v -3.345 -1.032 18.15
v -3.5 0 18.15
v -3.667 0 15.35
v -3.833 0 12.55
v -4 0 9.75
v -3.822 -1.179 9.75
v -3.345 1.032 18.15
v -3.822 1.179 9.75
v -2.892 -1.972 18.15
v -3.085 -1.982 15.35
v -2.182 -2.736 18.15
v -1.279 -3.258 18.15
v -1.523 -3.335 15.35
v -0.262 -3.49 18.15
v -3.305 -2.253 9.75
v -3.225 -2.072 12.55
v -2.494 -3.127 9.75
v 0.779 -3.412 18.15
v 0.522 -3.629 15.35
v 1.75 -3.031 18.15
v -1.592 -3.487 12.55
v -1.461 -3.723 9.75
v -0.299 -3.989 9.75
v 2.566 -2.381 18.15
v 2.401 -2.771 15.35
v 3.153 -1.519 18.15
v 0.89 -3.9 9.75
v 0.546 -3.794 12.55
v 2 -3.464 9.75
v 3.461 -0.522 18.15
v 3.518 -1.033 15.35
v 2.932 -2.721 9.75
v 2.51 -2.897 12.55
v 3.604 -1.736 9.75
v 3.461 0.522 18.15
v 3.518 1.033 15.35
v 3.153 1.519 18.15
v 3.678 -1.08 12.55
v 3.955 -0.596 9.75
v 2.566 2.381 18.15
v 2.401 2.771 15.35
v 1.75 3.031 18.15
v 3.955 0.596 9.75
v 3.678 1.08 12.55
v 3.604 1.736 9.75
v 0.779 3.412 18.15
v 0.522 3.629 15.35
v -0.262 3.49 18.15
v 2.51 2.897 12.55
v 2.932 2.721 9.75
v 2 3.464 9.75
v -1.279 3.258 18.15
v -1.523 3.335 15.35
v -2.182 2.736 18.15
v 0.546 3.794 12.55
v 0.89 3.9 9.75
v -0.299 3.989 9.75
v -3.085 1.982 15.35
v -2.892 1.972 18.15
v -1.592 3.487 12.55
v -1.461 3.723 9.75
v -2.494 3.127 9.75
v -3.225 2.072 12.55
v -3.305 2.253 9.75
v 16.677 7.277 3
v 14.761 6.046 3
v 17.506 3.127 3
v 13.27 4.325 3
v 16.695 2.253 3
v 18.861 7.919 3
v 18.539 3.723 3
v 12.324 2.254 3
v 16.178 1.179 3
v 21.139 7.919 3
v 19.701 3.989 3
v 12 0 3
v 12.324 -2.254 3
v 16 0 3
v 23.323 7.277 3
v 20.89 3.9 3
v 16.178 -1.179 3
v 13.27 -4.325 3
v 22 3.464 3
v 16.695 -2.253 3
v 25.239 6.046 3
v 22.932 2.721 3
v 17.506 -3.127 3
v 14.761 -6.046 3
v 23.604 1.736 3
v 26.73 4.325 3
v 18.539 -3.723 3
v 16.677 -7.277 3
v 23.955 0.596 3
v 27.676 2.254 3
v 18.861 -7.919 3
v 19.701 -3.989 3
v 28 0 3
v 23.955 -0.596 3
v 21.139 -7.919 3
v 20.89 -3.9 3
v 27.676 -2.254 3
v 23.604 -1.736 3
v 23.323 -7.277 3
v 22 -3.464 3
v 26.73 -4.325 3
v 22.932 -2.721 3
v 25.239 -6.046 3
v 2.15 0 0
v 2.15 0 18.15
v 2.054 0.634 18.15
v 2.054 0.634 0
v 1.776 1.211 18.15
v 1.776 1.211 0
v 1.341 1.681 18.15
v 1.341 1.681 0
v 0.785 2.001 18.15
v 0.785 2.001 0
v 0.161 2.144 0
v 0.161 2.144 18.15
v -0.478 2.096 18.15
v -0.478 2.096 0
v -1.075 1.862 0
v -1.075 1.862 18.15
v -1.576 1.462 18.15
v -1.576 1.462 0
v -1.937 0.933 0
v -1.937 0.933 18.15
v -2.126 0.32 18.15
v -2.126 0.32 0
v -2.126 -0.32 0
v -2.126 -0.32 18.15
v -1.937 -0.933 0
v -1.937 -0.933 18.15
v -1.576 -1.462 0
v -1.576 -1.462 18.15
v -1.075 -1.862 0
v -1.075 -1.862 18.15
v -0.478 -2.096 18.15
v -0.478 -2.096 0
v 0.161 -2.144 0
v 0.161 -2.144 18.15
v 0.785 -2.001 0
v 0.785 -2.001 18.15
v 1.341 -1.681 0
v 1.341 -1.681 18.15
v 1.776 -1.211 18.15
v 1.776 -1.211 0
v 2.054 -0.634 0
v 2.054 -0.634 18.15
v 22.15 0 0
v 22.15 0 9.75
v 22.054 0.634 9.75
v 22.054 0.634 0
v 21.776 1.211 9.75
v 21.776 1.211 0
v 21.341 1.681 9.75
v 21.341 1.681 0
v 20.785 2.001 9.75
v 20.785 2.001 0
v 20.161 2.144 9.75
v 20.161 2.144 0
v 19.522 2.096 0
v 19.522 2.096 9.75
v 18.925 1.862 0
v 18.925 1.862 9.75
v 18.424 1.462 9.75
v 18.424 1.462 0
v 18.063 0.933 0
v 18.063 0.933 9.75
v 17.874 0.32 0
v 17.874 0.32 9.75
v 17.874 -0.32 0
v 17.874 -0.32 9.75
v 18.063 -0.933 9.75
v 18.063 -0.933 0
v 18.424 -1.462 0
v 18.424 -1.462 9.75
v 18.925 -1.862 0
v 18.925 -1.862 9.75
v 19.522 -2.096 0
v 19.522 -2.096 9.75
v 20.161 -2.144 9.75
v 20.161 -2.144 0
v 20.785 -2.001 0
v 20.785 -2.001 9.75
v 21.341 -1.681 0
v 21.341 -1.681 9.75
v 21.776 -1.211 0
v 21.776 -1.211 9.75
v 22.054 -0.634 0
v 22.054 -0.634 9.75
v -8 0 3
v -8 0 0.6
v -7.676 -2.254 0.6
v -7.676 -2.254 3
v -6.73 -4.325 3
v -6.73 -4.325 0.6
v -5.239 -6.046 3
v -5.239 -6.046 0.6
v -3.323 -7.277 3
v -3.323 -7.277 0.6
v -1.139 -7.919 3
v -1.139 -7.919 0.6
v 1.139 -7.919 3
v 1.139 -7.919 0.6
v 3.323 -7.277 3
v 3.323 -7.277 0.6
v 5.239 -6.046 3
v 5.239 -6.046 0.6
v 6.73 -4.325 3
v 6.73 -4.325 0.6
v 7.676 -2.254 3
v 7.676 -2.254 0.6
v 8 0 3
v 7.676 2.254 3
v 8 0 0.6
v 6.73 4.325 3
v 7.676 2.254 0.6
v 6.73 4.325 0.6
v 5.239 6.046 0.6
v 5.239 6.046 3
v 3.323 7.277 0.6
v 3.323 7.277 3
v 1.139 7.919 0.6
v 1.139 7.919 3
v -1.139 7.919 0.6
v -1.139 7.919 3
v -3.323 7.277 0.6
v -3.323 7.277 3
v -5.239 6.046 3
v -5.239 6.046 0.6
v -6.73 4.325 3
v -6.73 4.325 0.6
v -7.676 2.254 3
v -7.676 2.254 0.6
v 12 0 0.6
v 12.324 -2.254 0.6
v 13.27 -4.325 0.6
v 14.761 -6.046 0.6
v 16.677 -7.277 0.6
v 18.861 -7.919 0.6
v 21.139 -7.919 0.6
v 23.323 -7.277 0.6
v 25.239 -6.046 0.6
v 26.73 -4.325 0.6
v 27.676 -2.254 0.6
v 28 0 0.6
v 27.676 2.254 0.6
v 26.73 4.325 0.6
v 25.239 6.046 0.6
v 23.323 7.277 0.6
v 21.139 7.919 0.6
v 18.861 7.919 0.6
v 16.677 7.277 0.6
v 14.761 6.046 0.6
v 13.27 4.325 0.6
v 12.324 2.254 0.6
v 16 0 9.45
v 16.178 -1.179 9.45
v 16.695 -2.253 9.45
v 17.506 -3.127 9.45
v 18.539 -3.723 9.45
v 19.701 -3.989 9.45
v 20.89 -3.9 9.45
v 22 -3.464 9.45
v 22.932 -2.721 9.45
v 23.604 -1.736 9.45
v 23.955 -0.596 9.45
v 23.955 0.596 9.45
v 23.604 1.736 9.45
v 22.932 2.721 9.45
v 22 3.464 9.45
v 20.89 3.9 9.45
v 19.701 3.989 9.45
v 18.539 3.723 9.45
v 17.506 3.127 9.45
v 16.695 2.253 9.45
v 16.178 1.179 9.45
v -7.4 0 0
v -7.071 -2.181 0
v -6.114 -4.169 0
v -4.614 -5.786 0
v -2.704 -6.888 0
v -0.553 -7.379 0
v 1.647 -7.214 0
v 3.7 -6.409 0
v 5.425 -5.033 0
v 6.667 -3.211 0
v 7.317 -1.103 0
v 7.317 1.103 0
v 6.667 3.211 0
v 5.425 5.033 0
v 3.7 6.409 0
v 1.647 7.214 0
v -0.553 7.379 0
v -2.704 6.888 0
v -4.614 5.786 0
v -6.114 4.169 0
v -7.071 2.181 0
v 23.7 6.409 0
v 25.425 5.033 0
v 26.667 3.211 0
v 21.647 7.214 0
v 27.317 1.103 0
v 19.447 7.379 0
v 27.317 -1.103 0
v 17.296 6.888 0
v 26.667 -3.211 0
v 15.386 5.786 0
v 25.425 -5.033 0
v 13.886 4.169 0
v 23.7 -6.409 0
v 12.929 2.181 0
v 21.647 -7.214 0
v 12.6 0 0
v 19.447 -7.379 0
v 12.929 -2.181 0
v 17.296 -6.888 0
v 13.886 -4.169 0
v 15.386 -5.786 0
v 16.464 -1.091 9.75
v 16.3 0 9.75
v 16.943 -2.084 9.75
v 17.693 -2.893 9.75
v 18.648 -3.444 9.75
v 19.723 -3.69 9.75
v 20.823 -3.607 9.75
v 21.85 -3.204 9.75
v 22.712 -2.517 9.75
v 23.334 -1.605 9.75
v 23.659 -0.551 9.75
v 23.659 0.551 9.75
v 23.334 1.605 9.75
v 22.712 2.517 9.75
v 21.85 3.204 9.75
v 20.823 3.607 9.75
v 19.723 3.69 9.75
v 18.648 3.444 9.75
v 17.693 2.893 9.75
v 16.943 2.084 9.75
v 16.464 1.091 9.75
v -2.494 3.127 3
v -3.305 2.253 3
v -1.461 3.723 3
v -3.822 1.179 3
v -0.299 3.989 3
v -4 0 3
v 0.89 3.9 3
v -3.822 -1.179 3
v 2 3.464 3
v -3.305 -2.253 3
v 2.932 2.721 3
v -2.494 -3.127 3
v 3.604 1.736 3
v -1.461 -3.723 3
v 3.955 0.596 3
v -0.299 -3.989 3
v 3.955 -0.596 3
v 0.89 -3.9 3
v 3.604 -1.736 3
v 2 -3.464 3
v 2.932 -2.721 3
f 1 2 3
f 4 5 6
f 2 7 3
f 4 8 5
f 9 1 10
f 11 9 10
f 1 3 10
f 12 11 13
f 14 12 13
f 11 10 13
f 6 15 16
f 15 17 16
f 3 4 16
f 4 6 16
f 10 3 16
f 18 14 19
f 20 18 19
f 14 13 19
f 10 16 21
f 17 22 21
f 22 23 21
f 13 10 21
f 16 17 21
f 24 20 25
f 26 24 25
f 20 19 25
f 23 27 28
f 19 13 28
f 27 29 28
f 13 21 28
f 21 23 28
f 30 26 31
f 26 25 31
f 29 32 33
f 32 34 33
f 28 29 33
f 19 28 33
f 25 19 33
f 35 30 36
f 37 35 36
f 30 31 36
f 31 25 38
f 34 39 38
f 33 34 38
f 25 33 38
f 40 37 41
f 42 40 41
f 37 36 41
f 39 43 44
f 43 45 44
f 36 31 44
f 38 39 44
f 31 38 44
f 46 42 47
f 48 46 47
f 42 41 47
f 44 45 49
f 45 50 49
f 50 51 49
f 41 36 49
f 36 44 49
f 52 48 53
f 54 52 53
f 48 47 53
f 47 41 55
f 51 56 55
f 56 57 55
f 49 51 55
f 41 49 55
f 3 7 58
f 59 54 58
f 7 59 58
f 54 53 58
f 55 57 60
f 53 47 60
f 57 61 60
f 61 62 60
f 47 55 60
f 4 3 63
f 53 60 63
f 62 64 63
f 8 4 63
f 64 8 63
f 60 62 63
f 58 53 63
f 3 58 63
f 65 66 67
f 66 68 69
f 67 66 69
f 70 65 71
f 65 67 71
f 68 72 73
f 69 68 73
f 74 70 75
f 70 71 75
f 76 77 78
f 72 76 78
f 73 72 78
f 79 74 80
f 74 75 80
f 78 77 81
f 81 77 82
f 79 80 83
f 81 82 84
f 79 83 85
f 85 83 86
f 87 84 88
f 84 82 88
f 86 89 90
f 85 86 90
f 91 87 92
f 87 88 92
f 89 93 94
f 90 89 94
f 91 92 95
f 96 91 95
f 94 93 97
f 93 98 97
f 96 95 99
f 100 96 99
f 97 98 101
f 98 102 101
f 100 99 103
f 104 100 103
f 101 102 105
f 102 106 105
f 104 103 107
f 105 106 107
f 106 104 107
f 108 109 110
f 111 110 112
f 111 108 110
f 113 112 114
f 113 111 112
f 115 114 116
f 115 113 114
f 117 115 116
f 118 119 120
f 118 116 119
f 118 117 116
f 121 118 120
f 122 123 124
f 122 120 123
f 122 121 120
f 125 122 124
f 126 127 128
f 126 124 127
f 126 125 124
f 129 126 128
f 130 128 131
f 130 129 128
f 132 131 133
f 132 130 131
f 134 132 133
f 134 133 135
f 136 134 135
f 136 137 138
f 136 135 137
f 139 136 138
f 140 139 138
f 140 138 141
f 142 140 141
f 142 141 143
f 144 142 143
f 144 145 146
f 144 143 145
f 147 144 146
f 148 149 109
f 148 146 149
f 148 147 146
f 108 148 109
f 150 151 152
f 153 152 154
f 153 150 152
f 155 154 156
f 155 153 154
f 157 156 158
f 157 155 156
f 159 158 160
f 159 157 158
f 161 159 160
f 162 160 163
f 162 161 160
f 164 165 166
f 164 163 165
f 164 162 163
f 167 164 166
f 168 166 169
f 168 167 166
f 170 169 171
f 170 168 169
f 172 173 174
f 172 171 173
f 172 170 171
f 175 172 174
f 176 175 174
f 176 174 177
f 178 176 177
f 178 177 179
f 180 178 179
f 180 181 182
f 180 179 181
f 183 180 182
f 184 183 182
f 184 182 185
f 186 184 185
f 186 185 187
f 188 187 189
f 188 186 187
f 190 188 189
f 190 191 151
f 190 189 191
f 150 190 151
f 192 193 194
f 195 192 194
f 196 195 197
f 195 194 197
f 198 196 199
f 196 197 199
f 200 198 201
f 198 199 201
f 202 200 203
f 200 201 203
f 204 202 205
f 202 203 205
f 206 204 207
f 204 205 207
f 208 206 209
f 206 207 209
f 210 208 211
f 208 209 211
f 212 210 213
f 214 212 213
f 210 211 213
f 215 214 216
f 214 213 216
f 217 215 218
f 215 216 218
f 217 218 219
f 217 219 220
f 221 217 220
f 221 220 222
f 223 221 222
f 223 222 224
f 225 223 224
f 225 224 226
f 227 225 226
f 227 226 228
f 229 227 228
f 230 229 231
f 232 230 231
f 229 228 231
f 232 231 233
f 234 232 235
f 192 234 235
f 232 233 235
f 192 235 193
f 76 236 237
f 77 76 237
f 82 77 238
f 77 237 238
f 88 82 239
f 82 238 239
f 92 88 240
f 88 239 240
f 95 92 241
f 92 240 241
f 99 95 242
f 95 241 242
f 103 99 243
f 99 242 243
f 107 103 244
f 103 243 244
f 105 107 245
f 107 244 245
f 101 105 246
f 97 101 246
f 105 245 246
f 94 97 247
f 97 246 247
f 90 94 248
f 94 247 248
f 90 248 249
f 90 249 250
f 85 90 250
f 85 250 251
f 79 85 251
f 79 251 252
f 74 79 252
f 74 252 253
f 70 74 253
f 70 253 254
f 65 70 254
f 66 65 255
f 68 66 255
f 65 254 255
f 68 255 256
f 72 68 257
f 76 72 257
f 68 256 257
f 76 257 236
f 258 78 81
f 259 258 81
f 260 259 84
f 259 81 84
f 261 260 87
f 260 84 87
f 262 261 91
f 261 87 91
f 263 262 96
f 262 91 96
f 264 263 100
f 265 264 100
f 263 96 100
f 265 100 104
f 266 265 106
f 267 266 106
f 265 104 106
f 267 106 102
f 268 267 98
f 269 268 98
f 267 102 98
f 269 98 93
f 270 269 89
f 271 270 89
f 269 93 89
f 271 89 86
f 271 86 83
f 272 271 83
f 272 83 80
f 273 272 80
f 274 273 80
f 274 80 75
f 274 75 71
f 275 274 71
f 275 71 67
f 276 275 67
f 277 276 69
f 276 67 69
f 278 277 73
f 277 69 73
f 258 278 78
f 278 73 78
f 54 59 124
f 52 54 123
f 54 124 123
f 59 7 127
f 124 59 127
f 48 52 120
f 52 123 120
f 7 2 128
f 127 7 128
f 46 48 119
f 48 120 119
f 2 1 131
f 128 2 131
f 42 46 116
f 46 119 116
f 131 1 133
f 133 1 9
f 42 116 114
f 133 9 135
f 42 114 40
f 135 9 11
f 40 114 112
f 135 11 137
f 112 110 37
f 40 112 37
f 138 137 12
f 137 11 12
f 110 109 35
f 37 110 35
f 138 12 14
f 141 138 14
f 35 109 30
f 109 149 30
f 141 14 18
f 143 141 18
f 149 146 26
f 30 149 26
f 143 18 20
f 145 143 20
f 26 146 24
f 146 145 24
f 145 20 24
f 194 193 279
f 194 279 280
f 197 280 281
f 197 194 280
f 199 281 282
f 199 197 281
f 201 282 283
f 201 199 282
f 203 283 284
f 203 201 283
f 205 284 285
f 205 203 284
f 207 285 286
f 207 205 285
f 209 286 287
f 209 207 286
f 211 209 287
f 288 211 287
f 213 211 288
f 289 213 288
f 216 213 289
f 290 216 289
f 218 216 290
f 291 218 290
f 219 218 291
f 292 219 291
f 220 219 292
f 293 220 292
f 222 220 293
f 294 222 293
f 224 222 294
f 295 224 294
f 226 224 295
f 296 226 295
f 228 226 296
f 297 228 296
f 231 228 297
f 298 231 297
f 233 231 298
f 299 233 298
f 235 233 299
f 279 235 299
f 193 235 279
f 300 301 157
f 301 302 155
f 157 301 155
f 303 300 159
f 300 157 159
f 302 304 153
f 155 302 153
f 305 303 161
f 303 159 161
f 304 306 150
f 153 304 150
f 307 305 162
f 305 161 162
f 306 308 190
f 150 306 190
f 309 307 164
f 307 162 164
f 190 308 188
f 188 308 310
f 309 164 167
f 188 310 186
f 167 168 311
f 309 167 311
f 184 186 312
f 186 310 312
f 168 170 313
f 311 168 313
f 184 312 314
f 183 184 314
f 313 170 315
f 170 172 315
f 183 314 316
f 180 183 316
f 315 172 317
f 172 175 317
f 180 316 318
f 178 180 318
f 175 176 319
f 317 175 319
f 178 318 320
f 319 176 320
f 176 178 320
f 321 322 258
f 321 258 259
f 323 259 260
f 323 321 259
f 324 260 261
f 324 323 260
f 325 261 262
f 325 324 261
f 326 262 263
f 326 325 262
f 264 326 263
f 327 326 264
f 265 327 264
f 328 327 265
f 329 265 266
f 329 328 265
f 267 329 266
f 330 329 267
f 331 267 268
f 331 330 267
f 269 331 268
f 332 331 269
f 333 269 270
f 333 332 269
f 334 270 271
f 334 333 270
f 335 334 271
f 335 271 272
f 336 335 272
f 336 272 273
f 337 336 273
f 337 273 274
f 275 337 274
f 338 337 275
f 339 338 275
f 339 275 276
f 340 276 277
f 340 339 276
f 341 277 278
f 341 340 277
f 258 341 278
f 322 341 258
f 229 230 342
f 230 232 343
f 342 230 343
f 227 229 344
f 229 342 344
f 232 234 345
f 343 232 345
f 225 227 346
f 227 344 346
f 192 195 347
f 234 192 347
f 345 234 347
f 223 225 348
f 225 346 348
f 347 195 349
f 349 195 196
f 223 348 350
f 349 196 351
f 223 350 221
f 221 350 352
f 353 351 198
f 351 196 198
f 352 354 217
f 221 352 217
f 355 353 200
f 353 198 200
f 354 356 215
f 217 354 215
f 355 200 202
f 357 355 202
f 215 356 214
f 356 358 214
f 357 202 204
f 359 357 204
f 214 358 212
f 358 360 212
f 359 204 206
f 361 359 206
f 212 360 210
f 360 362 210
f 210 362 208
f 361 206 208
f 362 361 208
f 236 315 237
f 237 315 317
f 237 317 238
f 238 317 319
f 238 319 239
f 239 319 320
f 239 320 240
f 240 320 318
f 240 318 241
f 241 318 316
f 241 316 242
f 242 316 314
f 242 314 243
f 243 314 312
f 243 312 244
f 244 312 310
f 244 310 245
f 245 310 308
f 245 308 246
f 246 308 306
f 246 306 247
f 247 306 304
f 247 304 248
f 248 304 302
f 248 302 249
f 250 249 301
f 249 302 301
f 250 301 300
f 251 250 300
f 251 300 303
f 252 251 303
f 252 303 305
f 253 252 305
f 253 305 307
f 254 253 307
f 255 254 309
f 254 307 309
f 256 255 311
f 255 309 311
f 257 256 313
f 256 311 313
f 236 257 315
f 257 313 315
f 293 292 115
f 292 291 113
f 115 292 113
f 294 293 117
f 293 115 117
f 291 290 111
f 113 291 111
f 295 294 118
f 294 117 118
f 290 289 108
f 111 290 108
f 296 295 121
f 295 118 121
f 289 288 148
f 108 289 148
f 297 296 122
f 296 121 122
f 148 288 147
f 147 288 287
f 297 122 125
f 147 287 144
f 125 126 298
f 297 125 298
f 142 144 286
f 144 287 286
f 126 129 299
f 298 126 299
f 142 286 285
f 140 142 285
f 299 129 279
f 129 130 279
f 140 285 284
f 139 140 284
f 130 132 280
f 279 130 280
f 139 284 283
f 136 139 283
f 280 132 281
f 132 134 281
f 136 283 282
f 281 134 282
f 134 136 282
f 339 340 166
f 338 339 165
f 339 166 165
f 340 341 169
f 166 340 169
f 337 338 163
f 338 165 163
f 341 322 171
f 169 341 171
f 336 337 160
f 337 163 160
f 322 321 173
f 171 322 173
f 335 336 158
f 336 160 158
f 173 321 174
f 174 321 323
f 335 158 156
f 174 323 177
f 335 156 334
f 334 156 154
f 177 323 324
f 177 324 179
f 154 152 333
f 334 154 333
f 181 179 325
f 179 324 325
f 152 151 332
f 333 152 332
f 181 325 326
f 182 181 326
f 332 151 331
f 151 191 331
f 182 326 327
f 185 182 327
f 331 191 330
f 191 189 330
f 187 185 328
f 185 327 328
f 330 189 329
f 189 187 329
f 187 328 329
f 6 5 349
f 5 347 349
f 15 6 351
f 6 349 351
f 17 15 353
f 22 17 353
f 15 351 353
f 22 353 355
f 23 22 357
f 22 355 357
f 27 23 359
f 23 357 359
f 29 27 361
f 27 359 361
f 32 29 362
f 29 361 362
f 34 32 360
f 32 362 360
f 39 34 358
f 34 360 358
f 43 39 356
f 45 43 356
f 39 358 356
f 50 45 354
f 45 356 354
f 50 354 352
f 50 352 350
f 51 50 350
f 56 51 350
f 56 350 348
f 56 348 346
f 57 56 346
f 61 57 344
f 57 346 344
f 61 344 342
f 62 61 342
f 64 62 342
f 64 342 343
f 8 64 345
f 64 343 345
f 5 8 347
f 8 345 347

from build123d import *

# Parameters (mm, degrees)
F3_R      = 2.15
F4_DEPTH  = 18.151
F5_SIZE   = 0.6
F5_2_SIZE = 0.6
F6_SIZE   = 0.3


with BuildPart() as f1:
    # F0 (on Front) → F1 (revolve)
    with BuildSketch(Plane.XZ):
        Polygon((-3.5, 18.15), (-4, 9.75), (-4, 3), (-8, 3), (-8, 0), (0, 0), (0, 18.15), align=None)
    revolve(axis=Axis((0, 0, 9.6170306206), (0, 0, 1)))


with BuildPart() as f2:
    # F0 (on Front) → F2 (revolve)
    with BuildSketch(Plane.XZ):
        Polygon((12, 3), (12, 0), (20, 0), (20, 9.75), (16, 9.75), (16, 3), align=None)
    revolve(axis=Axis((20, 0, 4.875), (0, 0, 1)))


with BuildPart() as f4_tool:
    # F3 (on Top) → F4 (new body, through all)
    with BuildSketch(Plane.XY):
        Circle(F3_R)
        with Locations((20, 0)):
            Circle(F3_R)
    extrude(amount=F4_DEPTH)


with BuildPart() as f1_1:
    add(f1.part)

    # F4: cut by f4_tool
    add(f4_tool.part, mode=Mode.SUBTRACT)

    # F5
    f5_edges = [f1_1.edges().sort_by_distance(p)[0] for p in [
        (8, 0, 0),
    ]]
    chamfer(f5_edges, length=F5_SIZE)


with BuildPart() as f2_1:
    add(f2.part)

    # F4: cut by f4_tool
    add(f4_tool.part, mode=Mode.SUBTRACT)

    # F5#2
    f5_2_edges = [f2_1.edges().sort_by_distance(p)[0] for p in [
        (28, 0, 0),
    ]]
    chamfer(f5_2_edges, length=F5_2_SIZE)

    # F6
    f6_edges = [f2_1.edges().sort_by_distance(p)[0] for p in [
        (24, 0, 9.75),
    ]]
    chamfer(f6_edges, length=F6_SIZE)


solid = Compound([f1_1.part, f2_1.part])
